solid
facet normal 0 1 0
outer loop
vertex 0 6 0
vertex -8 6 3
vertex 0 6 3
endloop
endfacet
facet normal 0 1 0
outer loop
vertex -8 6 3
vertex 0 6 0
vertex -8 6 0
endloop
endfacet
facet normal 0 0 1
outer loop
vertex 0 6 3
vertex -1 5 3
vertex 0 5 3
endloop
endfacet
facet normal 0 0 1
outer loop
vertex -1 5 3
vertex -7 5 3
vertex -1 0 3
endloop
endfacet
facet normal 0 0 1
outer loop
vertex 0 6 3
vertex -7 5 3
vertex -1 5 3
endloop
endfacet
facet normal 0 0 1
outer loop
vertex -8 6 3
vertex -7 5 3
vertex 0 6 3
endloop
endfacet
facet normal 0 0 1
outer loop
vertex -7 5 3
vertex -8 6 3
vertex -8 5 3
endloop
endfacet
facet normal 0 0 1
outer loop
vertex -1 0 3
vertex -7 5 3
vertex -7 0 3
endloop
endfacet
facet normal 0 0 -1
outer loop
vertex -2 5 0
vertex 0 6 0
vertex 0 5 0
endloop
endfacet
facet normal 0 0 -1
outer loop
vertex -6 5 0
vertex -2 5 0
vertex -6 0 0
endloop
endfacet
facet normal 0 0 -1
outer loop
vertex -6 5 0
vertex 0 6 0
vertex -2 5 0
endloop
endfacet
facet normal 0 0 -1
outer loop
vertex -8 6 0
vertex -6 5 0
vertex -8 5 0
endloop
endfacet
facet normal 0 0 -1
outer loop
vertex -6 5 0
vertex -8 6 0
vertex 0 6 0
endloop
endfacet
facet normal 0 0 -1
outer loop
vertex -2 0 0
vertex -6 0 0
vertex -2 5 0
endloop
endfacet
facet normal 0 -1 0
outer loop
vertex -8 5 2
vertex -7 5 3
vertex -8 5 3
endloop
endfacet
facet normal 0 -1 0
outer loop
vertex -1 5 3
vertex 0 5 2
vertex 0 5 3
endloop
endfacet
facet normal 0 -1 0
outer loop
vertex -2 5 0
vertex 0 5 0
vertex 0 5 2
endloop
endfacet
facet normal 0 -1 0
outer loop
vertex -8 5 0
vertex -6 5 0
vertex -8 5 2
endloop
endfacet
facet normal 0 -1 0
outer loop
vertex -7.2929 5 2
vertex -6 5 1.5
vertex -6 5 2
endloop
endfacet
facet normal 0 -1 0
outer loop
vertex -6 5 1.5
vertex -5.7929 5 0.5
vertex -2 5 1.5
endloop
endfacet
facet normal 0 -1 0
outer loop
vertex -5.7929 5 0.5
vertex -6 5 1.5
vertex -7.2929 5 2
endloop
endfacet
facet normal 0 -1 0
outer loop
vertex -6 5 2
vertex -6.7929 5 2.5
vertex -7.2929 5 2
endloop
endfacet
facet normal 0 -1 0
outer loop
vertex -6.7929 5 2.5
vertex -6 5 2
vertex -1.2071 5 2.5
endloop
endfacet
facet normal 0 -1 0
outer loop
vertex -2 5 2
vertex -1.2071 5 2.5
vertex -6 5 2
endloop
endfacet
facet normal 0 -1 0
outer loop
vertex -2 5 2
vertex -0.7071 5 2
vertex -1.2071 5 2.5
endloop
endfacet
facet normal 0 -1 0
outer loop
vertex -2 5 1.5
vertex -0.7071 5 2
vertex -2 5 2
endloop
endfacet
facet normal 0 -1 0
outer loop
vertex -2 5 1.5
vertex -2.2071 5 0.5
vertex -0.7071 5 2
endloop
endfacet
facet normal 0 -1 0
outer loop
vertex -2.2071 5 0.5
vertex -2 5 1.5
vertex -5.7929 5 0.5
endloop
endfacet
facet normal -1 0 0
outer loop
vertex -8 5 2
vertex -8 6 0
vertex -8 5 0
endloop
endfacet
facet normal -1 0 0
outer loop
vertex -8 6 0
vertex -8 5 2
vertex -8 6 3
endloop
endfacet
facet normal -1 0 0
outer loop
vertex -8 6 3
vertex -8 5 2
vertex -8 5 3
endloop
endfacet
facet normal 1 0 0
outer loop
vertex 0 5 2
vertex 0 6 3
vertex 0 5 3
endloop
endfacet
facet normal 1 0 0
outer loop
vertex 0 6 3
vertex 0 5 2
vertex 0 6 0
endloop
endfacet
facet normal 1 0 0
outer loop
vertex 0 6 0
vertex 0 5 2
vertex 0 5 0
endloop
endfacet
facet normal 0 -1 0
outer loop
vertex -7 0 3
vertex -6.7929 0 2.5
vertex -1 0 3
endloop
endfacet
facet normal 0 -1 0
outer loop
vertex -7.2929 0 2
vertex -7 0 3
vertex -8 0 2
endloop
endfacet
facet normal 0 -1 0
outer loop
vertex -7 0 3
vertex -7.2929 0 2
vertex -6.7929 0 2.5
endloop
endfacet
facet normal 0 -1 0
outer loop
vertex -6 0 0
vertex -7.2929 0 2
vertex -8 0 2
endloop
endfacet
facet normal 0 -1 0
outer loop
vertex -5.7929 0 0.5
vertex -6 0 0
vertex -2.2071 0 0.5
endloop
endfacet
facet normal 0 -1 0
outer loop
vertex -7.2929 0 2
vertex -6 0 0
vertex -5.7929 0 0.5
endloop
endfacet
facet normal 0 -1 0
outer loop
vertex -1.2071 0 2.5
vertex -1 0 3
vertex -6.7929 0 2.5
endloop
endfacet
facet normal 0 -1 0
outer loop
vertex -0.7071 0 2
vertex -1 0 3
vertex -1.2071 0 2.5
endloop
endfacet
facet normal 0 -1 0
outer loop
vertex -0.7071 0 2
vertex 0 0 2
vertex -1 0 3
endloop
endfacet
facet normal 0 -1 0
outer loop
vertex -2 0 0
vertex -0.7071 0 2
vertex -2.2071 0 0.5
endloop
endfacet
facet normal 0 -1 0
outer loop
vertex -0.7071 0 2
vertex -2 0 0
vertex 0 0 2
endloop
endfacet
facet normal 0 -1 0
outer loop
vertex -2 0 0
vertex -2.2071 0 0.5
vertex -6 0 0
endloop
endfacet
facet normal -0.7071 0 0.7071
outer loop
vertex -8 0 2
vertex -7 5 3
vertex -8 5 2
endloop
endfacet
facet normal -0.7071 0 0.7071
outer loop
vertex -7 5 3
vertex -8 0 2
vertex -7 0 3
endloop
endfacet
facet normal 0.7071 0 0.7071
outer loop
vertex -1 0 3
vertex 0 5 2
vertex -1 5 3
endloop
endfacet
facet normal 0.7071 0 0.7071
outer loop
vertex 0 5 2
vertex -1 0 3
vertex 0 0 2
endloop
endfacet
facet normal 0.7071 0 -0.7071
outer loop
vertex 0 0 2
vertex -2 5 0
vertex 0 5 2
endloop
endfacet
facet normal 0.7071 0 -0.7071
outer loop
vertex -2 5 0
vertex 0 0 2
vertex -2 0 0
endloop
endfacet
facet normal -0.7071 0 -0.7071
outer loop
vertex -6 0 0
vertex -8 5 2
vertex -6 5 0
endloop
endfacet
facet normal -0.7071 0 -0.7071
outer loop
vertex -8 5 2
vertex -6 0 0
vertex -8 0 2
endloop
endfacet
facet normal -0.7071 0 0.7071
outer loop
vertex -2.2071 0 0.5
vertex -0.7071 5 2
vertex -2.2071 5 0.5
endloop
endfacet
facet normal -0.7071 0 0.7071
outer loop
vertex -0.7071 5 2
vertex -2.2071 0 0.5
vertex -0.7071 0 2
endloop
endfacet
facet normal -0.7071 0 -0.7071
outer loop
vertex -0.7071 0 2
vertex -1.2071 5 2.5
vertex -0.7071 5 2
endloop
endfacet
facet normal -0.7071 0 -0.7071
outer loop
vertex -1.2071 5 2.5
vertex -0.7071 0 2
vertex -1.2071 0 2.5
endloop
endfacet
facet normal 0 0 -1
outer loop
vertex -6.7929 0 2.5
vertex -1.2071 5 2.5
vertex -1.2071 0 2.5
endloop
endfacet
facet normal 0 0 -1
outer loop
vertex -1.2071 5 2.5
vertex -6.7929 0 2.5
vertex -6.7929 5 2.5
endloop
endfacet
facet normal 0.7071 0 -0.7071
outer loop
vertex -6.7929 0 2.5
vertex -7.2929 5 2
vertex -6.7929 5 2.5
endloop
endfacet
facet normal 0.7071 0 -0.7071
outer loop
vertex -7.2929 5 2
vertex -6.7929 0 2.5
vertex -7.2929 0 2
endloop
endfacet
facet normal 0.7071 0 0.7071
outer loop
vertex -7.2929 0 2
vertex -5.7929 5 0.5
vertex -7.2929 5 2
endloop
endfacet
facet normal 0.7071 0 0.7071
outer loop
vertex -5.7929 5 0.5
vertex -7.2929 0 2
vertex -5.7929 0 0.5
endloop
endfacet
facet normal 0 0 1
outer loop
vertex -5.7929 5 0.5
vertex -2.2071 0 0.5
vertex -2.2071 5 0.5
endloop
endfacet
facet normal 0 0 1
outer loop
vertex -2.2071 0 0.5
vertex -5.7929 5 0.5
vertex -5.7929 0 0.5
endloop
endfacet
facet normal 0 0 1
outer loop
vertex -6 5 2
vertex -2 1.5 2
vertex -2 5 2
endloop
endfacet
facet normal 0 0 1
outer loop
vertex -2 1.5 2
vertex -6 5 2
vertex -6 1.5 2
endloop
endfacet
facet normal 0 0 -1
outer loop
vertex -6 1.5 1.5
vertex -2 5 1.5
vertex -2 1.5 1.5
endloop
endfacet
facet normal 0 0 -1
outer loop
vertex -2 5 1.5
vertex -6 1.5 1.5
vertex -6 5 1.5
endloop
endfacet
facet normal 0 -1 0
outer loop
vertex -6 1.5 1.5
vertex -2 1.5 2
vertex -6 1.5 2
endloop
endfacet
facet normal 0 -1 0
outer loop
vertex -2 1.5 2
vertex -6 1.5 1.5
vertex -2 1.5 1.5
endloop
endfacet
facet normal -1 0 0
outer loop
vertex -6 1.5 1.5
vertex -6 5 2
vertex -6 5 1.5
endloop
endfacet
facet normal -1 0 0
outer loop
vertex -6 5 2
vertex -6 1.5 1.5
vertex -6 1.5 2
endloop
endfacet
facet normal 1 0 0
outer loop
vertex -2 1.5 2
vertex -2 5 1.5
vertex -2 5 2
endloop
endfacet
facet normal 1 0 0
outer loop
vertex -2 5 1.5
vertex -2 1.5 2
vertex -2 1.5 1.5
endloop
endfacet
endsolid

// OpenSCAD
include <../../lib/device/component.scad>;

rotate([0,0,90]) microusb();
